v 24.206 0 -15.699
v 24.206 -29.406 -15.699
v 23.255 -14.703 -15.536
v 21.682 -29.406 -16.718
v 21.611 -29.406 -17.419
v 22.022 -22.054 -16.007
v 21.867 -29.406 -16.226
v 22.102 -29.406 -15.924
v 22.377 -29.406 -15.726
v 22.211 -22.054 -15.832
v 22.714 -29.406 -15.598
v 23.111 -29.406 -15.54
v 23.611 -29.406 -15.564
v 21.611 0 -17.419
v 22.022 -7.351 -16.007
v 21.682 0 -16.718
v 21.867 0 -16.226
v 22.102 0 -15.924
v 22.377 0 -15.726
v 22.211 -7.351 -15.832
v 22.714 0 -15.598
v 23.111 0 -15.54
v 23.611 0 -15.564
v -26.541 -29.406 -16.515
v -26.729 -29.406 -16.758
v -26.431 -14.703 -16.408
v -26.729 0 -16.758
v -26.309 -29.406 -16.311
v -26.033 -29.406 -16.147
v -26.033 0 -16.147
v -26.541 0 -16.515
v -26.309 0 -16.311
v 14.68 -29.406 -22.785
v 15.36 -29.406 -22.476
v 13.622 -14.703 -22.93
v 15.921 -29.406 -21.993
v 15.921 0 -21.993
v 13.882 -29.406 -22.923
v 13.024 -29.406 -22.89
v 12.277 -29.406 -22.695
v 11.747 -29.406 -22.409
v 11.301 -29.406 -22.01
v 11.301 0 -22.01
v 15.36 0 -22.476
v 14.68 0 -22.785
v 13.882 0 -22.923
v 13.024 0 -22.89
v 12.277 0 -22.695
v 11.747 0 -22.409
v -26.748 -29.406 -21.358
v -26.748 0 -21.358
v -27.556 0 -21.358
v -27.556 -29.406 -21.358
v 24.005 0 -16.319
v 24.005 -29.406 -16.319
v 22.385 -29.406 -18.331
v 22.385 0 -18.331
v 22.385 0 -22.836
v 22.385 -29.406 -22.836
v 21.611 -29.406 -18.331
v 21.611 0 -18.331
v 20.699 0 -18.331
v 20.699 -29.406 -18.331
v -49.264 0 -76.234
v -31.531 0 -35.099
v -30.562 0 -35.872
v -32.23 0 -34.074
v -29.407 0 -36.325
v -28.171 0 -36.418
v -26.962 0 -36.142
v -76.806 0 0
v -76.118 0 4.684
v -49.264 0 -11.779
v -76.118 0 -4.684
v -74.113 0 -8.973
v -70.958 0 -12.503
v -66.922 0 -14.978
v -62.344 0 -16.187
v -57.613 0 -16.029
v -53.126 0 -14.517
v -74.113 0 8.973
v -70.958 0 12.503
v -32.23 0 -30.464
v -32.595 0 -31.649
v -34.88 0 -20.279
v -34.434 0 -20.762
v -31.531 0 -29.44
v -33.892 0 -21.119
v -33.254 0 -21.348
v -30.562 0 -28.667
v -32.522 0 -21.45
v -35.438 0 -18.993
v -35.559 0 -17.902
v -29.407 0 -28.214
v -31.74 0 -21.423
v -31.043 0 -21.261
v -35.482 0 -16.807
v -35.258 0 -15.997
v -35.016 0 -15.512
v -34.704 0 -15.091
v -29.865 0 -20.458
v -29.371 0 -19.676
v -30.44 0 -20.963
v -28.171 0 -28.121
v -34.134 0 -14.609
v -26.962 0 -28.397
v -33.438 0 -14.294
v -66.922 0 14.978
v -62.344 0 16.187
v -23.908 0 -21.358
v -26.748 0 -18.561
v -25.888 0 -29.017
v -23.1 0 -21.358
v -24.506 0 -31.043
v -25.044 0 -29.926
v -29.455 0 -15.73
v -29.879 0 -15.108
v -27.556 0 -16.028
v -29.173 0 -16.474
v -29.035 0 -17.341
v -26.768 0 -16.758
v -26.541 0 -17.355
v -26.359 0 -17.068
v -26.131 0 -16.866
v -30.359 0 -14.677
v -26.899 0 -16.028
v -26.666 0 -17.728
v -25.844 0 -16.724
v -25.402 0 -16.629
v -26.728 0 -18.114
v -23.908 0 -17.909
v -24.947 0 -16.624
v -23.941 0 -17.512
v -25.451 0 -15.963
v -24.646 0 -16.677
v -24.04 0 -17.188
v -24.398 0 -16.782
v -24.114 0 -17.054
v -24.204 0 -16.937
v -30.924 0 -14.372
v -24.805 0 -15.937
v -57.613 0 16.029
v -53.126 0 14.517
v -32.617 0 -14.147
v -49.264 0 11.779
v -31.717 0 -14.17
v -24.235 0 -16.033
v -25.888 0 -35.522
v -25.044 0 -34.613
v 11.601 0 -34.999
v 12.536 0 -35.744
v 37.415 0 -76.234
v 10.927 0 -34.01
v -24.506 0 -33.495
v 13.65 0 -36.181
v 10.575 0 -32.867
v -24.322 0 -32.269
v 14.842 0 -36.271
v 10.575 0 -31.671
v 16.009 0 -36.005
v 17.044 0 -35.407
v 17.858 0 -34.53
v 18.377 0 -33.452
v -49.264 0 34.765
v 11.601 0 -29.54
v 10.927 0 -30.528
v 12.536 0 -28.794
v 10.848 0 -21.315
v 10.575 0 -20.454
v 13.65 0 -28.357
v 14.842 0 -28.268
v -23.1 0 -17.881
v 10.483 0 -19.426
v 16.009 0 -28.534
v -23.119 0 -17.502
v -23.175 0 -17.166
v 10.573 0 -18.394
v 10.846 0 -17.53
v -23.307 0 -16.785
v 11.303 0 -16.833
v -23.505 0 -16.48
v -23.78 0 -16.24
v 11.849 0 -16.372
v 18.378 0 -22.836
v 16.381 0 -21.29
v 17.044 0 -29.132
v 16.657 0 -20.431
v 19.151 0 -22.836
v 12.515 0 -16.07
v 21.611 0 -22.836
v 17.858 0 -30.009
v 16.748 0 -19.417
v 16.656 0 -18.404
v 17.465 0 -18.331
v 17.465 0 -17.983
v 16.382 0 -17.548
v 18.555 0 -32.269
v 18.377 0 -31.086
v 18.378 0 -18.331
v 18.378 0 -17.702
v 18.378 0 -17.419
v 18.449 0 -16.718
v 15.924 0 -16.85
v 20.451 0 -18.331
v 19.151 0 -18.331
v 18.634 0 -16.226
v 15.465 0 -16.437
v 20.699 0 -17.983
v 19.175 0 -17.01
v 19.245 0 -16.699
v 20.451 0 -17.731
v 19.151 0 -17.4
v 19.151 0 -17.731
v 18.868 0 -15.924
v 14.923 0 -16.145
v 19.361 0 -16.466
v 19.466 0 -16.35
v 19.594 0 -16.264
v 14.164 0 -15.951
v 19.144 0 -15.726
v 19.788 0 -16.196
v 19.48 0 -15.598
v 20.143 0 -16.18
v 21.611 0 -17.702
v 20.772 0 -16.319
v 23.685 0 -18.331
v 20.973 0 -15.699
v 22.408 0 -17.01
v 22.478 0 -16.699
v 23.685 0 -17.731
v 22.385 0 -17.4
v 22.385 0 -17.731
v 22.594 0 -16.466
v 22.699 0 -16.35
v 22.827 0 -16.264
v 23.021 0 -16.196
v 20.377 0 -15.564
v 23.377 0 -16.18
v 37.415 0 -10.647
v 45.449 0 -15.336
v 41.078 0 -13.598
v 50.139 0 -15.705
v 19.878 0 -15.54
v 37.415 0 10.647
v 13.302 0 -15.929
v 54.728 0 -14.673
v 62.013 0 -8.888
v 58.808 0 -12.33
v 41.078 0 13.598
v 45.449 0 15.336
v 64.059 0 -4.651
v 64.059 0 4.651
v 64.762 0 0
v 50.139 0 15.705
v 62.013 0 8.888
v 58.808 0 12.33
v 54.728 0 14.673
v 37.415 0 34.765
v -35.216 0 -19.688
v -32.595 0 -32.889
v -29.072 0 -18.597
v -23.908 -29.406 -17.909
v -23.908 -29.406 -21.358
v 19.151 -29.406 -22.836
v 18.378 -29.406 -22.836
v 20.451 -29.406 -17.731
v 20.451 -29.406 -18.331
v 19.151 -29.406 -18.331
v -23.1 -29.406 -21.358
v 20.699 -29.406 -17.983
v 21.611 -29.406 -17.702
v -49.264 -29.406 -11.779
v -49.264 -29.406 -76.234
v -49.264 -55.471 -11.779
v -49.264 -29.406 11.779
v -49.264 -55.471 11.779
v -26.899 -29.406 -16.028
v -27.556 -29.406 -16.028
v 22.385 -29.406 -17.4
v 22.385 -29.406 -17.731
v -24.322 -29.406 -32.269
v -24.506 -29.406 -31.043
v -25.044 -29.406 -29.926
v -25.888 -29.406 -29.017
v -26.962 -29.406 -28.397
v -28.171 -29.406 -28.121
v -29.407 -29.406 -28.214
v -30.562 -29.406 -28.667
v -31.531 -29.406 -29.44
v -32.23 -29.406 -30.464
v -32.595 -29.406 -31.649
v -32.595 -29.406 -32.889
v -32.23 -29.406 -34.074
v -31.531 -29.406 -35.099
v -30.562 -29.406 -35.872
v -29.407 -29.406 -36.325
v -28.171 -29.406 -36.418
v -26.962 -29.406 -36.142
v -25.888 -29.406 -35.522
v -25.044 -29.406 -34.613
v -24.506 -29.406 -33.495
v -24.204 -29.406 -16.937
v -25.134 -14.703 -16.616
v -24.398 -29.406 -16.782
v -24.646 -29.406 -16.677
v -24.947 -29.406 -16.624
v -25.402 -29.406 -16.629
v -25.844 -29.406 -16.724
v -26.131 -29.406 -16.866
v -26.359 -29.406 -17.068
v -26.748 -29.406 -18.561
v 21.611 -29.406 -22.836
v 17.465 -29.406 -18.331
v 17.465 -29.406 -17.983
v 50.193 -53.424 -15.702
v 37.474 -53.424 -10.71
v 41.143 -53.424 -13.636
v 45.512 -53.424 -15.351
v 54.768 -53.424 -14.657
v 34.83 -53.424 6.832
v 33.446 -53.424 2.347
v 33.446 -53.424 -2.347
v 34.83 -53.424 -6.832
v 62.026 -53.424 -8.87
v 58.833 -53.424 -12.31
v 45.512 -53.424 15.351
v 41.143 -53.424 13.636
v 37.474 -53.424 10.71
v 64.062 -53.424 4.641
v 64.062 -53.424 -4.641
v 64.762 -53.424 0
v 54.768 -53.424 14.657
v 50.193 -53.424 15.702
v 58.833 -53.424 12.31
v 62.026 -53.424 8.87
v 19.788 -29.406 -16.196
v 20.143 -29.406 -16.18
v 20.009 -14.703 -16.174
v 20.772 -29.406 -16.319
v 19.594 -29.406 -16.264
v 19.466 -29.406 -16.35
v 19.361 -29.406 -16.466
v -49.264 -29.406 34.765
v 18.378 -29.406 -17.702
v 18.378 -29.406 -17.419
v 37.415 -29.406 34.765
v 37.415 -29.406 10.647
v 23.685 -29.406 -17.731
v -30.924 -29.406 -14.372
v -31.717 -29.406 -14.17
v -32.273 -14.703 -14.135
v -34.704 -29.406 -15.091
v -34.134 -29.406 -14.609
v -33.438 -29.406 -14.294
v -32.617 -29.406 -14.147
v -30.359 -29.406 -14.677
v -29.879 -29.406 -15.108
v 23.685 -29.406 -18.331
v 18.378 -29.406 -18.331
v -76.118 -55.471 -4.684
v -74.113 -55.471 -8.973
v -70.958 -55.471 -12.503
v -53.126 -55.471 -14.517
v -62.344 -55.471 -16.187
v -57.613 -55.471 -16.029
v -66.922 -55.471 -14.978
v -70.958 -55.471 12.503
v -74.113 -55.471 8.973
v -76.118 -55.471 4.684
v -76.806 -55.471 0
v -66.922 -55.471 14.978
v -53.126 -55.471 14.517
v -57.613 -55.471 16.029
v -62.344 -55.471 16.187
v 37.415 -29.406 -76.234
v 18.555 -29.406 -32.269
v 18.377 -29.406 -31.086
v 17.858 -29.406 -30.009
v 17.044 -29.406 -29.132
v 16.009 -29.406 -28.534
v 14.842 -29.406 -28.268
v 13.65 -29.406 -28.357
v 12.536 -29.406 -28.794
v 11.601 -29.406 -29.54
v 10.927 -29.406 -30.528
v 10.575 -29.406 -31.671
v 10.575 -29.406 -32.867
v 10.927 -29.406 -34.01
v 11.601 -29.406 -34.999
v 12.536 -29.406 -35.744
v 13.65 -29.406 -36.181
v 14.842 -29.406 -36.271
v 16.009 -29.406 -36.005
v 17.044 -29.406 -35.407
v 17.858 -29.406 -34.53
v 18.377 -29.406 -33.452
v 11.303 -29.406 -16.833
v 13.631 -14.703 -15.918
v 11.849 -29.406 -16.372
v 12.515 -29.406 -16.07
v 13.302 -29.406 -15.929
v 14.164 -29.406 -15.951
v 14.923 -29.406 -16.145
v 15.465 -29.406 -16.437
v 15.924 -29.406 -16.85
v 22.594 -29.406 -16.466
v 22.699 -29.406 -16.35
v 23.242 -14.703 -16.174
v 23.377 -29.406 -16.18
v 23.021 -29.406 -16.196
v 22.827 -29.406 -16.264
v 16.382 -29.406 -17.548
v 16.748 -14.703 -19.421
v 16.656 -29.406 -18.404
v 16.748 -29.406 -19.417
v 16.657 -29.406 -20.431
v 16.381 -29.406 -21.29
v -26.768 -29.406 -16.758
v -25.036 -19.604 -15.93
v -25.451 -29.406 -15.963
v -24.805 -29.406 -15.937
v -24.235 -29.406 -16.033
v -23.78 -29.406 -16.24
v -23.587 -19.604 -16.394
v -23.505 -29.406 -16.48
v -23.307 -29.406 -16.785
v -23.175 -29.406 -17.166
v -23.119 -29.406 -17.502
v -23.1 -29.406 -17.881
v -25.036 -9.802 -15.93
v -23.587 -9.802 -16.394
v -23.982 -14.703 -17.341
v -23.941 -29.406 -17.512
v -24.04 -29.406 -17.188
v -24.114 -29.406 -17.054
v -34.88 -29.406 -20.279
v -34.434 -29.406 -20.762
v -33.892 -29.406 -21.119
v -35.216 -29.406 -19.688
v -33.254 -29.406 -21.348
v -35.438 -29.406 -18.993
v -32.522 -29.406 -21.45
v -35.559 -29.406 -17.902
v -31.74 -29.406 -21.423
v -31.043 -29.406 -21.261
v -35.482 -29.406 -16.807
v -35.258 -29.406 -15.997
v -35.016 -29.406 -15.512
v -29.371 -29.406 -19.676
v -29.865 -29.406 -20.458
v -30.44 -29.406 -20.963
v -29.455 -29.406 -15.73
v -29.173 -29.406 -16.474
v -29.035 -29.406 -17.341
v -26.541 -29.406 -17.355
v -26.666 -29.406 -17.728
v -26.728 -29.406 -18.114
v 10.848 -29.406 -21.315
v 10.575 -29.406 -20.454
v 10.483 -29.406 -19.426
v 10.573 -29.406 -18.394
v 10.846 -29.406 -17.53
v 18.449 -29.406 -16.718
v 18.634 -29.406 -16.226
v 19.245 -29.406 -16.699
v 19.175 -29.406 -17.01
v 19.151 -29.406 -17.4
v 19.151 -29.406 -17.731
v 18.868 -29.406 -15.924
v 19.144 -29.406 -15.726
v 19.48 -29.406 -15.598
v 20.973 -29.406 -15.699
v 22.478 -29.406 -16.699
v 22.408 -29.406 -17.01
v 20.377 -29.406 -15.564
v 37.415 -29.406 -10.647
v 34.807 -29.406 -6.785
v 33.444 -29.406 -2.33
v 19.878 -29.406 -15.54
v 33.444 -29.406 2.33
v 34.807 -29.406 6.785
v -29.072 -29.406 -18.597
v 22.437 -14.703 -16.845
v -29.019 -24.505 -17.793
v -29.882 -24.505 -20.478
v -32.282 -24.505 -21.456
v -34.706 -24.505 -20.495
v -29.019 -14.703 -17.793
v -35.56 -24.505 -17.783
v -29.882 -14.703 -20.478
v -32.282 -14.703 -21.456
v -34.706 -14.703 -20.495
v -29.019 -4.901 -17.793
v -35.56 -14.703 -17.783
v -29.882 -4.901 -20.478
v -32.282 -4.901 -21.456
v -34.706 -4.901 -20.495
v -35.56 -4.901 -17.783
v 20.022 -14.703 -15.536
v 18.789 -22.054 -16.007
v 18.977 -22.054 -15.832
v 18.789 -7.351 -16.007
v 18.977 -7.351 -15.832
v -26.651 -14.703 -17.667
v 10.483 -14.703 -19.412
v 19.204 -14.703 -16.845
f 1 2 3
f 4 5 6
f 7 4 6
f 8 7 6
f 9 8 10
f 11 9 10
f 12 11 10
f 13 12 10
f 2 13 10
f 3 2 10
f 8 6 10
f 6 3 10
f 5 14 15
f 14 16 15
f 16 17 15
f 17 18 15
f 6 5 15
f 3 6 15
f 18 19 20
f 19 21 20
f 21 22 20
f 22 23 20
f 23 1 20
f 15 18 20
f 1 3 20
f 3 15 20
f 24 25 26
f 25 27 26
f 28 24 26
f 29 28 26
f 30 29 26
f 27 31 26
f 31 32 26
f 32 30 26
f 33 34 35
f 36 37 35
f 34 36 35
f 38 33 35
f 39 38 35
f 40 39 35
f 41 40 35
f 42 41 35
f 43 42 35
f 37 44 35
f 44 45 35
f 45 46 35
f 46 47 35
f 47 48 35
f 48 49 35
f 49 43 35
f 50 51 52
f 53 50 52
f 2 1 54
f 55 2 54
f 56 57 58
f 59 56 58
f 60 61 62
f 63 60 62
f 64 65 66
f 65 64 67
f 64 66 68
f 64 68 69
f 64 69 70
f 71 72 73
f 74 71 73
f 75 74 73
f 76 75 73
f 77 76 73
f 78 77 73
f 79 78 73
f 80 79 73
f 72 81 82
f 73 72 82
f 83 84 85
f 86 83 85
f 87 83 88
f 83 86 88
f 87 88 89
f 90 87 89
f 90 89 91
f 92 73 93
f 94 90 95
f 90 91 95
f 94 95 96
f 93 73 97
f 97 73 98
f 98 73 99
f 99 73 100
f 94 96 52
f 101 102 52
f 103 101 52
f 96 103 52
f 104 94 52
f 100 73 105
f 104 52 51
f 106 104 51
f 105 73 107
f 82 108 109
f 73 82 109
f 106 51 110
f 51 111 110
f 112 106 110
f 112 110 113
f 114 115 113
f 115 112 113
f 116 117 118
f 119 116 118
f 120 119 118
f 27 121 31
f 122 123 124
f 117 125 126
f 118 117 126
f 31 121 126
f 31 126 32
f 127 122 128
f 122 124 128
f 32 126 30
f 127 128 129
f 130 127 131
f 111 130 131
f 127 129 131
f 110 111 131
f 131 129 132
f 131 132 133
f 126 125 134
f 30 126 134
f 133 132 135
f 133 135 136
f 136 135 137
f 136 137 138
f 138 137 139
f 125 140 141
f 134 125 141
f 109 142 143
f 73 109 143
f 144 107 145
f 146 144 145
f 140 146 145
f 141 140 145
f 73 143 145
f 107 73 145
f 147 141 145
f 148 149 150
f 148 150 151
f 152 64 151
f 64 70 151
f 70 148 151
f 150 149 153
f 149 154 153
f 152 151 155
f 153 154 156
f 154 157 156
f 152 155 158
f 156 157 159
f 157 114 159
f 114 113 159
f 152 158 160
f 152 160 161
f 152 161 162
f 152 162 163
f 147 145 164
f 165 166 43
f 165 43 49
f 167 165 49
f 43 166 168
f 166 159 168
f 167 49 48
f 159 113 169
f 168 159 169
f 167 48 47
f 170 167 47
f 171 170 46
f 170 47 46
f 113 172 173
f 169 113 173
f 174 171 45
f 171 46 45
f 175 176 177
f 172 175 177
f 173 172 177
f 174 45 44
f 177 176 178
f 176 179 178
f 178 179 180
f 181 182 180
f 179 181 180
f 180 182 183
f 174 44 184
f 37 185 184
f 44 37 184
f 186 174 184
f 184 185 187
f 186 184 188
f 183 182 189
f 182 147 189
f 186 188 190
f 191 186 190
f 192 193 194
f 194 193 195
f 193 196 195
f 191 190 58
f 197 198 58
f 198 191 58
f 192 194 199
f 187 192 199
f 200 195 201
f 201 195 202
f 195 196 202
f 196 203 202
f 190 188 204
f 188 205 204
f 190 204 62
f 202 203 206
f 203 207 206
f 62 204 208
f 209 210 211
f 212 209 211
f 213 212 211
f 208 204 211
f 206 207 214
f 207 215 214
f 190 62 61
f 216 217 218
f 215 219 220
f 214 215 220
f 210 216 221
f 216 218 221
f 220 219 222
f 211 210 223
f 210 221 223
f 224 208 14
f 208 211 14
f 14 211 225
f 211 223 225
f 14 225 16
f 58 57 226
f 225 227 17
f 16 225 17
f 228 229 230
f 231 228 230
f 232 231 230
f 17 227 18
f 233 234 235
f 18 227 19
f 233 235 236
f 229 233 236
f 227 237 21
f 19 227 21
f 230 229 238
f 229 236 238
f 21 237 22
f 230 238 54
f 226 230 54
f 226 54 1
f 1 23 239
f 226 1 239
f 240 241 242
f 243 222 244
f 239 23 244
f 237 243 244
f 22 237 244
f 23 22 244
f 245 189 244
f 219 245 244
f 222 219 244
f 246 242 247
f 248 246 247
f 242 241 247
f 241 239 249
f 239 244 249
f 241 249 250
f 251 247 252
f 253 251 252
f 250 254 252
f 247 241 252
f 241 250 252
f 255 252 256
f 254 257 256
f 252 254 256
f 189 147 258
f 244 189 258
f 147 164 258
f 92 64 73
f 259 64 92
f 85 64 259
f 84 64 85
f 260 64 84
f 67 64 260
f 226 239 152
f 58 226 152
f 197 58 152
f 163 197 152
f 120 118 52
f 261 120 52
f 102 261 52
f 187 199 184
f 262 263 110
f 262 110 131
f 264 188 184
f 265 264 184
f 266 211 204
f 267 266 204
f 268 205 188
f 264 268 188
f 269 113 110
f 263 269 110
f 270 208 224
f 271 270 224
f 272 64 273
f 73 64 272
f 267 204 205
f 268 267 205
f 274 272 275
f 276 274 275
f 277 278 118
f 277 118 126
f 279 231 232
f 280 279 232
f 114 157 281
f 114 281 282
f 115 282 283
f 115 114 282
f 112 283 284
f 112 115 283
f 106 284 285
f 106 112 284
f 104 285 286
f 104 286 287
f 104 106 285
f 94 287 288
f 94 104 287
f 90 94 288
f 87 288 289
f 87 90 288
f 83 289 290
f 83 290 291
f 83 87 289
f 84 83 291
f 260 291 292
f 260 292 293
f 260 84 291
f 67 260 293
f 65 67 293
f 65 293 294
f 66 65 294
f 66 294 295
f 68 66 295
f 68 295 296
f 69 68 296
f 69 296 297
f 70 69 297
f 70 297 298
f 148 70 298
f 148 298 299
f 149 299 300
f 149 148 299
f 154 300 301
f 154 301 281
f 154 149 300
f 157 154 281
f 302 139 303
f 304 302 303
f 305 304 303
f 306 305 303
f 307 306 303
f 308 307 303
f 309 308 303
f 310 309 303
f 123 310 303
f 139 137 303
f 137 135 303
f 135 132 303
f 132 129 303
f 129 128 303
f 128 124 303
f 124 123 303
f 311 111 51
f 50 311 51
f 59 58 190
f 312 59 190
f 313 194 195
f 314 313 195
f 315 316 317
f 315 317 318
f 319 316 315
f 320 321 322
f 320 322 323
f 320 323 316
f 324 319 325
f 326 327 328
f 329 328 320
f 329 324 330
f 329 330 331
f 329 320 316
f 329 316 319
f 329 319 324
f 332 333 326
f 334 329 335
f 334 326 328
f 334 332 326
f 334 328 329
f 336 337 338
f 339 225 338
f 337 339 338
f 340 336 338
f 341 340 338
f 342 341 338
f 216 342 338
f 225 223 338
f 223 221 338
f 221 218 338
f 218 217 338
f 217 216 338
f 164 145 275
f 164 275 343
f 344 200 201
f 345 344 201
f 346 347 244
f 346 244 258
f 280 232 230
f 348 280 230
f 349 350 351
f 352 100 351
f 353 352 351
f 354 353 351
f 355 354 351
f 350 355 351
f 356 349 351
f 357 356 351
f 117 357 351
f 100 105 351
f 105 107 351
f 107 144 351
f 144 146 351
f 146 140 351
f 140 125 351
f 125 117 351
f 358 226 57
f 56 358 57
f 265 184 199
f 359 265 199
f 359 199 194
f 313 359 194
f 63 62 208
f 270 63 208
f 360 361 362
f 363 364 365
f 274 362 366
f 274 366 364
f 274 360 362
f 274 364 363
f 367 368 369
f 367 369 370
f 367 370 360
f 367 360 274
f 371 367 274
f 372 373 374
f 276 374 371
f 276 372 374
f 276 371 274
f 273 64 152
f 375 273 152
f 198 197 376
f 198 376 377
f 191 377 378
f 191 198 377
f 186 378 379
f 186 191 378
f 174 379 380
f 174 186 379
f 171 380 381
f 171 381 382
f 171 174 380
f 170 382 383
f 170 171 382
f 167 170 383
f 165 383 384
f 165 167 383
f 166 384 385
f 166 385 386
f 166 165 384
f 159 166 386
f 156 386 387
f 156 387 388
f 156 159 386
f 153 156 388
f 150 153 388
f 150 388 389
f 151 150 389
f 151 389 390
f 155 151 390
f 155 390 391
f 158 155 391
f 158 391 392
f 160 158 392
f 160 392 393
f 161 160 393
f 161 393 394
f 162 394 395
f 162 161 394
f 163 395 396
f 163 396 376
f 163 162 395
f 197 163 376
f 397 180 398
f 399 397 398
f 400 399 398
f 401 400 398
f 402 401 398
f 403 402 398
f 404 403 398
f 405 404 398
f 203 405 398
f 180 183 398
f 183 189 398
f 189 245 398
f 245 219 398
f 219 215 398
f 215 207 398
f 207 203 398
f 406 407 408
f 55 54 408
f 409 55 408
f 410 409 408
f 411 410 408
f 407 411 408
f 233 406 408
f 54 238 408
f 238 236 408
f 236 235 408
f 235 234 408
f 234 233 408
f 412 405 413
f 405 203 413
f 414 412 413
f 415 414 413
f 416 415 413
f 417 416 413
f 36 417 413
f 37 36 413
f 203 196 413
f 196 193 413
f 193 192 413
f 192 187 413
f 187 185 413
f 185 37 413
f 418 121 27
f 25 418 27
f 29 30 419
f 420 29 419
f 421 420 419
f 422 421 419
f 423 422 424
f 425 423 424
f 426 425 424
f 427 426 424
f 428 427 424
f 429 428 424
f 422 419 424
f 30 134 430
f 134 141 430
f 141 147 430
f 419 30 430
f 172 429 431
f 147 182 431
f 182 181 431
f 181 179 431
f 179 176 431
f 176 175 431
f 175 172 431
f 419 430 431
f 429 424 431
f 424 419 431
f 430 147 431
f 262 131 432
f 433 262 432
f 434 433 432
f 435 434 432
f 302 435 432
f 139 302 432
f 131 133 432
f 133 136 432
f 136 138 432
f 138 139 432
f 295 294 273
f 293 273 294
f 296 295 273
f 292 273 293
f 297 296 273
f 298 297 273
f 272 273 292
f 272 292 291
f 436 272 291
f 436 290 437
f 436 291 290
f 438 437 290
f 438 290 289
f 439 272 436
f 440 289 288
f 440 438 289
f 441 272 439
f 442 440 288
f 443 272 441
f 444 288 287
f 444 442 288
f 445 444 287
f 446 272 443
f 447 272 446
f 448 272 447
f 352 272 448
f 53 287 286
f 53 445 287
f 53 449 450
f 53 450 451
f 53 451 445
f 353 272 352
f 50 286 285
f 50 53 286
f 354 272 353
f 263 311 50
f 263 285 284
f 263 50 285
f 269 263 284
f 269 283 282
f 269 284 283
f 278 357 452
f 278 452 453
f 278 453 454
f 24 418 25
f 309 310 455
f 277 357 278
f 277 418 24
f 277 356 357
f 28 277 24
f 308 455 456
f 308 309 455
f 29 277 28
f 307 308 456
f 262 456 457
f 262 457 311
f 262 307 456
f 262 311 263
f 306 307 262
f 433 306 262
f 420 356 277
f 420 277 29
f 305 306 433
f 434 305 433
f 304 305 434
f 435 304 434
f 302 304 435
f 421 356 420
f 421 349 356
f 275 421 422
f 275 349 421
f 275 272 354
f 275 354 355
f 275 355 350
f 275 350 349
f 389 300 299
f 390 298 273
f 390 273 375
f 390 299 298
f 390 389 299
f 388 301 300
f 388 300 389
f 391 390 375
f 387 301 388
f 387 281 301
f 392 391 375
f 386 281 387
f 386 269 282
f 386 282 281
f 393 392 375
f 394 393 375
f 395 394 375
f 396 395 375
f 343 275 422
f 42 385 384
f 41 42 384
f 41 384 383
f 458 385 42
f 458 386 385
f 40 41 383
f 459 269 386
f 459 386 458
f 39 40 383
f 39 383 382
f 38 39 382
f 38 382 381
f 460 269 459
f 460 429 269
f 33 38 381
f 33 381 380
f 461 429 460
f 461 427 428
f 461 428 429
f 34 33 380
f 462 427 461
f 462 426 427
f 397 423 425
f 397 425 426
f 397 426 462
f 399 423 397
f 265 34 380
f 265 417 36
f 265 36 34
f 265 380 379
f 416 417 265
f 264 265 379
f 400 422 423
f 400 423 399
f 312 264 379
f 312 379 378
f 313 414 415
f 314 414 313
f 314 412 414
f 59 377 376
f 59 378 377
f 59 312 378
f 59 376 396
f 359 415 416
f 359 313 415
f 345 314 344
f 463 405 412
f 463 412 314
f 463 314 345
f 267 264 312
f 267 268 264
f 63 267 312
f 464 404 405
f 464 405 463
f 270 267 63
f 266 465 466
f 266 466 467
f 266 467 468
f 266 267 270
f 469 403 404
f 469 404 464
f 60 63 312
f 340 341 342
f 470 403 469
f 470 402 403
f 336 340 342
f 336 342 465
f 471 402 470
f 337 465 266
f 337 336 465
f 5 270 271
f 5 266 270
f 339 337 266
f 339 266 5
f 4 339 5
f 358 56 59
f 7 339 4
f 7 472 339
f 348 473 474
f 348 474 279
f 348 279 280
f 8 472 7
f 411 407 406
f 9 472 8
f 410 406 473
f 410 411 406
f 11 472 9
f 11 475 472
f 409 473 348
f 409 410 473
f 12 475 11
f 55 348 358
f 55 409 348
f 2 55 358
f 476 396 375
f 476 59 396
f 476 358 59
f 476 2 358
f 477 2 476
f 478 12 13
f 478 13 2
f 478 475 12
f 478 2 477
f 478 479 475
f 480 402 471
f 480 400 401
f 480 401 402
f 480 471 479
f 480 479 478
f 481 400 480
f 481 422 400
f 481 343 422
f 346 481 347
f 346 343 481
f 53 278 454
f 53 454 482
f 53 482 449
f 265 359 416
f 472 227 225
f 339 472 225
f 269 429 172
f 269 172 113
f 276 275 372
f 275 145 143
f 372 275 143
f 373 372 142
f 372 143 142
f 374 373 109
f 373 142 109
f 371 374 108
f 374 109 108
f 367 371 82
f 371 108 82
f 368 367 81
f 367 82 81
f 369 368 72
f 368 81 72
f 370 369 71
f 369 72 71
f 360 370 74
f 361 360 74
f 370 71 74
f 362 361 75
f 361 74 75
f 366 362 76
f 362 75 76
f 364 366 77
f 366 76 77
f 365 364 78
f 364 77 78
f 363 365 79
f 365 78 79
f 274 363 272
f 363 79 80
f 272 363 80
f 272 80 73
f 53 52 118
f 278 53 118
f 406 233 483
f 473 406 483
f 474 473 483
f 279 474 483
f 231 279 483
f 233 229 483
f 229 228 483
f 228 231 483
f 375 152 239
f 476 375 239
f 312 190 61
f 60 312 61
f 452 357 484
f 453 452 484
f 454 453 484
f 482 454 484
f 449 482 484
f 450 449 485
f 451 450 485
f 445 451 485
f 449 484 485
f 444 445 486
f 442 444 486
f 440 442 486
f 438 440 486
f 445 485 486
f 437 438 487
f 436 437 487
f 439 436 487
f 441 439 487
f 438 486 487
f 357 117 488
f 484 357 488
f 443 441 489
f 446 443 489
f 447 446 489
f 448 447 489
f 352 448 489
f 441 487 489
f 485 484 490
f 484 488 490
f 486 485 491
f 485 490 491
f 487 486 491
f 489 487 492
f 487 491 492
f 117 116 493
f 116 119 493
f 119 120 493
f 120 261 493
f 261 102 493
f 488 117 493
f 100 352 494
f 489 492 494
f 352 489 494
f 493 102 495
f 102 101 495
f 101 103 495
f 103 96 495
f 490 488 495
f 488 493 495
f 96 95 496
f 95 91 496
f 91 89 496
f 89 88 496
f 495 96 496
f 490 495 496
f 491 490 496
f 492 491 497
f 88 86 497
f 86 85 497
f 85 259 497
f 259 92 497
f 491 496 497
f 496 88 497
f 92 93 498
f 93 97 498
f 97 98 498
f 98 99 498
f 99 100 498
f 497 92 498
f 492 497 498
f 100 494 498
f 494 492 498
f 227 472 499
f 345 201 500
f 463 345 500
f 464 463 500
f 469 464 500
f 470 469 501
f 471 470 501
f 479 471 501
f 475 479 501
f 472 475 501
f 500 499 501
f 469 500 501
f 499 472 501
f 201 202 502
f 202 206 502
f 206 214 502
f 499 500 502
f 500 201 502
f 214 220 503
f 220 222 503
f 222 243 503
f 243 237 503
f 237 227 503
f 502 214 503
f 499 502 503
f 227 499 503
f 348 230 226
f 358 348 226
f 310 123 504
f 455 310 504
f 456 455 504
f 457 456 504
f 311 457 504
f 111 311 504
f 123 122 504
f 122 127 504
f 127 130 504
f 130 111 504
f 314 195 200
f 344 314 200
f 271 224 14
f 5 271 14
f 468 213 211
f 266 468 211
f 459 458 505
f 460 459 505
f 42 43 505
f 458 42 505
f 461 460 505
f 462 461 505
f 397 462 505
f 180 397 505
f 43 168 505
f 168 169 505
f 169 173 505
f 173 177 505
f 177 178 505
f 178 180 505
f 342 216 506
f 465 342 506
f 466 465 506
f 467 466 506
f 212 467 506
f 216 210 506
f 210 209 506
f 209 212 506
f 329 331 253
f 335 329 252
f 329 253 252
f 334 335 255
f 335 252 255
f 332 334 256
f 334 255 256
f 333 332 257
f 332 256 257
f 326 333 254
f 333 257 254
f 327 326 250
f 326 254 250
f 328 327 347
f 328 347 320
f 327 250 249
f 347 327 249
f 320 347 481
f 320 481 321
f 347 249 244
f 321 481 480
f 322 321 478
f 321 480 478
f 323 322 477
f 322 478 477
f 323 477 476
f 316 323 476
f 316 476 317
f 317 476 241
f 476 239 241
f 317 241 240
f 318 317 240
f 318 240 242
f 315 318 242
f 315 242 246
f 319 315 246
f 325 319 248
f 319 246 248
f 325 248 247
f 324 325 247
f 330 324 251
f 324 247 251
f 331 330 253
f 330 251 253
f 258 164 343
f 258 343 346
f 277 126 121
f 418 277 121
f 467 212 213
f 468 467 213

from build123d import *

# Parameters (mm, degrees)
F0_W     = 86.6790302098
F0_H     = 110.9990477562
F0_R     = 4.1600175763
F0_R_2   = 4.0127427681
F1_DEPTH = 29.40571
F2_R     = 16.2901854198
F3_DEPTH = 25.4
F2_R_2   = 18.5490265687
F4_DEPTH = 30.0706941634
F6_R     = 15.7455659212
F7_DEPTH = 53.42441


with BuildPart() as f1:
    # F0 (on Front) → F1 (new body)
    with BuildSketch(Plane.XZ):
        with Locations((-5.9241037816, -20.7343772054)):
            Rectangle(F0_W, F0_H)
        with Locations((-28.4816268831, -32.2692543268)):
            Circle(F0_R, mode=Mode.SUBTRACT)
        with Locations((14.5424827933, -32.2692543268)):
            Circle(F0_R_2, mode=Mode.SUBTRACT)
        with BuildLine():
            add(Edge.make_bspline(
                [(-29.8793415714, -15.1079879142), (-29.0187247447, -16.080656118), (-29.0187247447, -17.7925521566)],
                knots=[0, 0, 0, 1, 1, 1], degree=2))
            add(Edge.make_bspline(
                [(-29.0187247447, -17.7925521566), (-29.0187247447, -19.4997793878), (-29.8824541096, -20.4778945335)],
                knots=[0, 0, 0, 1, 1, 1], degree=2))
            add(Edge.make_bspline(
                [(-29.8824541096, -20.4778945335), (-30.7461834745, -21.4560096792), (-32.2822211019, -21.4560096792)],
                knots=[0, 0, 0, 1, 1, 1], degree=2))
            add(Edge.make_bspline(
                [(-32.2822211019, -21.4560096792), (-33.8524966501, -21.4560096792), (-34.7061102657, -20.4950134939)],
                knots=[0, 0, 0, 1, 1, 1], degree=2))
            add(Edge.make_bspline(
                [(-34.7061102657, -20.4950134939), (-35.5597238813, -19.5340173086), (-35.5597238813, -17.7832145419)],
                knots=[0, 0, 0, 1, 1, 1], degree=2))
            add(Edge.make_bspline(
                [(-35.5597238813, -17.7832145419), (-35.5597238813, -16.0464181972), (-34.703775862, -15.0908689538)],
                knots=[0, 0, 0, 1, 1, 1], degree=2))
            add(Edge.make_bspline(
                [(-34.703775862, -15.0908689538), (-33.8478278427, -14.1353197105), (-32.2728834872, -14.1353197105)],
                knots=[0, 0, 0, 1, 1, 1], degree=2))
            add(Edge.make_bspline(
                [(-32.2728834872, -14.1353197105), (-30.739958398, -14.1353197105), (-29.8793415714, -15.1079879142)],
                knots=[0, 0, 0, 1, 1, 1], degree=2))
        make_face(mode=Mode.SUBTRACT)
        with BuildLine():
            Line((-23.1002332584, -21.3579647243), (-23.9079369348, -21.3579647243))
            Line((-23.9079369348, -21.3579647243), (-23.9079369348, -17.9092723411))
            add(Edge.make_bspline(
                [(-23.9079369348, -17.9092723411), (-23.9079369348, -17.2587518464), (-24.2044062034, -16.9373822719)],
                knots=[0, 0, 0, 1, 1, 1], degree=2))
            add(Edge.make_bspline(
                [(-24.2044062034, -16.9373822719), (-24.5008754719, -16.6160126973), (-25.1342770061, -16.6160126973)],
                knots=[0, 0, 0, 1, 1, 1], degree=2))
            add(Edge.make_bspline(
                [(-25.1342770061, -16.6160126973), (-25.9699935268, -16.6160126973), (-26.3590608083, -17.0681088784)],
                knots=[0, 0, 0, 1, 1, 1], degree=2))
            add(Edge.make_bspline(
                [(-26.3590608083, -17.0681088784), (-26.7481280898, -17.5202050596), (-26.7481280898, -18.5613491049)],
                knots=[0, 0, 0, 1, 1, 1], degree=2))
            Line((-26.7481280898, -18.5613491049), (-26.7481280898, -21.3579647243))
            Line((-26.7481280898, -21.3579647243), (-27.5558317662, -21.3579647243))
            Line((-27.5558317662, -21.3579647243), (-27.5558317662, -16.0277429677))
            Line((-27.5558317662, -16.0277429677), (-26.899086195, -16.0277429677))
            Line((-26.899086195, -16.0277429677), (-26.7683595885, -16.7576331878))
            Line((-26.7683595885, -16.7576331878), (-26.7294528603, -16.7576331878))
            add(Edge.make_bspline(
                [(-26.7294528603, -16.7576331878), (-26.4804498001, -16.3638970989), (-26.0330224264, -16.1467975558)],
                knots=[0, 0, 0, 1, 1, 1], degree=2))
            add(Edge.make_bspline(
                [(-26.0330224264, -16.1467975558), (-25.5855950527, -15.9296980128), (-25.0362320512, -15.9296980128)],
                knots=[0, 0, 0, 1, 1, 1], degree=2))
            add(Edge.make_bspline(
                [(-25.0362320512, -15.9296980128), (-24.0729014622, -15.9296980128), (-23.5865673603, -16.3942443469)],
                knots=[0, 0, 0, 1, 1, 1], degree=2))
            add(Edge.make_bspline(
                [(-23.5865673603, -16.3942443469), (-23.1002332584, -16.858790681), (-23.1002332584, -17.8812594968)],
                knots=[0, 0, 0, 1, 1, 1], degree=2))
            Line((-23.1002332584, -17.8812594968), (-23.1002332584, -21.3579647243))
        make_face(mode=Mode.SUBTRACT)
        with BuildLine():
            add(Edge.make_bspline(
                [(15.9240844259, -16.8496811724), (16.7484452225, -17.7813728502), (16.7484452225, -19.4211502033)],
                knots=[0, 0, 0, 1, 1, 1], degree=2))
            add(Edge.make_bspline(
                [(16.7484452225, -19.4211502033), (16.7484452225, -21.0564554363), (15.9211030126, -21.9933645876)],
                knots=[0, 0, 0, 1, 1, 1], degree=2))
            add(Edge.make_bspline(
                [(15.9211030126, -21.9933645876), (15.0937608026, -22.9302737389), (13.6224333049, -22.9302737389)],
                knots=[0, 0, 0, 1, 1, 1], degree=2))
            add(Edge.make_bspline(
                [(13.6224333049, -22.9302737389), (12.1183102601, -22.9302737389), (11.3006576436, -22.0097623611)],
                knots=[0, 0, 0, 1, 1, 1], degree=2))
            add(Edge.make_bspline(
                [(11.3006576436, -22.0097623611), (10.4830050271, -21.0892509834), (10.4830050271, -19.4122059632)],
                knots=[0, 0, 0, 1, 1, 1], degree=2))
            add(Edge.make_bspline(
                [(10.4830050271, -19.4122059632), (10.4830050271, -17.7485773032), (11.3028937036, -16.8332833988)],
                knots=[0, 0, 0, 1, 1, 1], degree=2))
            add(Edge.make_bspline(
                [(11.3028937036, -16.8332833988), (12.1227823802, -15.9179894945), (13.631377545, -15.9179894945)],
                knots=[0, 0, 0, 1, 1, 1], degree=2))
            add(Edge.make_bspline(
                [(13.631377545, -15.9179894945), (15.0997236293, -15.9179894945), (15.9240844259, -16.8496811724)],
                knots=[0, 0, 0, 1, 1, 1], degree=2))
        make_face(mode=Mode.SUBTRACT)
        with BuildLine():
            Line((20.4513606271, -17.730688823), (20.4513606271, -18.3314436169))
            Line((20.4513606271, -18.3314436169), (19.1514643981, -18.3314436169))
            Line((19.1514643981, -18.3314436169), (19.1514643981, -22.8363592178))
            Line((19.1514643981, -22.8363592178), (18.3777876288, -22.8363592178))
            Line((18.3777876288, -22.8363592178), (18.3777876288, -18.3314436169))
            Line((18.3777876288, -18.3314436169), (17.4654751378, -18.3314436169))
            Line((17.4654751378, -18.3314436169), (17.4654751378, -17.9826182527))
            Line((17.4654751378, -17.9826182527), (18.3777876288, -17.702365396))
            Line((18.3777876288, -17.702365396), (18.3777876288, -17.4191311259))
            add(Edge.make_bspline(
                [(18.3777876288, -17.4191311259), (18.3777876288, -15.5363685832), (20.0220371019, -15.5363685832)],
                knots=[0, 0, 0, 1, 1, 1], degree=2))
            add(Edge.make_bspline(
                [(20.0220371019, -15.5363685832), (20.4275093201, -15.5363685832), (20.9731079667, -15.6988556118)],
                knots=[0, 0, 0, 1, 1, 1], degree=2))
            Line((20.9731079667, -15.6988556118), (20.7718625643, -16.3189895926))
            add(Edge.make_bspline(
                [(20.7718625643, -16.3189895926), (20.3246505589, -16.1743910442), (20.0086207418, -16.1743910442)],
                knots=[0, 0, 0, 1, 1, 1], degree=2))
            add(Edge.make_bspline(
                [(20.0086207418, -16.1743910442), (19.5703529765, -16.1743910442), (19.3609086873, -16.4658242011)],
                knots=[0, 0, 0, 1, 1, 1], degree=2))
            add(Edge.make_bspline(
                [(19.3609086873, -16.4658242011), (19.1514643981, -16.7572573579), (19.1514643981, -17.399751939)],
                knots=[0, 0, 0, 1, 1, 1], degree=2))
            Line((19.1514643981, -17.399751939), (19.1514643981, -17.730688823))
            Line((19.1514643981, -17.730688823), (20.4513606271, -17.730688823))
        make_face(mode=Mode.SUBTRACT)
        with BuildLine():
            Line((23.684703426, -17.730688823), (23.684703426, -18.3314436169))
            Line((23.684703426, -18.3314436169), (22.384807197, -18.3314436169))
            Line((22.384807197, -18.3314436169), (22.384807197, -22.8363592178))
            Line((22.384807197, -22.8363592178), (21.6111304277, -22.8363592178))
            Line((21.6111304277, -22.8363592178), (21.6111304277, -18.3314436169))
            Line((21.6111304277, -18.3314436169), (20.6988179367, -18.3314436169))
            Line((20.6988179367, -18.3314436169), (20.6988179367, -17.9826182527))
            Line((20.6988179367, -17.9826182527), (21.6111304277, -17.702365396))
            Line((21.6111304277, -17.702365396), (21.6111304277, -17.4191311259))
            add(Edge.make_bspline(
                [(21.6111304277, -17.4191311259), (21.6111304277, -15.5363685832), (23.2553799009, -15.5363685832)],
                knots=[0, 0, 0, 1, 1, 1], degree=2))
            add(Edge.make_bspline(
                [(23.2553799009, -15.5363685832), (23.6608521191, -15.5363685832), (24.2064507656, -15.6988556118)],
                knots=[0, 0, 0, 1, 1, 1], degree=2))
            Line((24.2064507656, -15.6988556118), (24.0052053632, -16.3189895926))
            add(Edge.make_bspline(
                [(24.0052053632, -16.3189895926), (23.5579933578, -16.1743910442), (23.2419635407, -16.1743910442)],
                knots=[0, 0, 0, 1, 1, 1], degree=2))
            add(Edge.make_bspline(
                [(23.2419635407, -16.1743910442), (22.8036957754, -16.1743910442), (22.5942514862, -16.4658242011)],
                knots=[0, 0, 0, 1, 1, 1], degree=2))
            add(Edge.make_bspline(
                [(22.5942514862, -16.4658242011), (22.384807197, -16.7572573579), (22.384807197, -17.399751939)],
                knots=[0, 0, 0, 1, 1, 1], degree=2))
            Line((22.384807197, -17.399751939), (22.384807197, -17.730688823))
            Line((22.384807197, -17.730688823), (23.684703426, -17.730688823))
        make_face(mode=Mode.SUBTRACT)
    extrude(amount=F1_DEPTH)

    # F2 (on Front) → F3 (join)
    with BuildSketch(Plane.XZ):
        with Locations((-60.5162531137, 0)):
            Circle(F2_R)
    extrude(amount=F3_DEPTH)

    # F4 (add): a face of the model
    f4_faces = [f1.faces().sort_by_distance(p)[0] for p in [
        (-61.9656260946, -25.4, 0),
    ]]
    extrude(f4_faces, amount=F4_DEPTH)

    # F6 (on Front) → F7 (join)
    with BuildSketch(Plane.XZ):
        with Locations((49.0159541368, 0)):
            Circle(F6_R)
    extrude(amount=F7_DEPTH)


with BuildPart() as f3:
    # F2 (on Front) → F3, piece 2 (new body)
    with BuildSketch(Plane.XZ):
        with Locations((56.2986545265, 0)):
            Circle(F2_R_2)
    extrude(amount=F3_DEPTH)


solid = f1.part
